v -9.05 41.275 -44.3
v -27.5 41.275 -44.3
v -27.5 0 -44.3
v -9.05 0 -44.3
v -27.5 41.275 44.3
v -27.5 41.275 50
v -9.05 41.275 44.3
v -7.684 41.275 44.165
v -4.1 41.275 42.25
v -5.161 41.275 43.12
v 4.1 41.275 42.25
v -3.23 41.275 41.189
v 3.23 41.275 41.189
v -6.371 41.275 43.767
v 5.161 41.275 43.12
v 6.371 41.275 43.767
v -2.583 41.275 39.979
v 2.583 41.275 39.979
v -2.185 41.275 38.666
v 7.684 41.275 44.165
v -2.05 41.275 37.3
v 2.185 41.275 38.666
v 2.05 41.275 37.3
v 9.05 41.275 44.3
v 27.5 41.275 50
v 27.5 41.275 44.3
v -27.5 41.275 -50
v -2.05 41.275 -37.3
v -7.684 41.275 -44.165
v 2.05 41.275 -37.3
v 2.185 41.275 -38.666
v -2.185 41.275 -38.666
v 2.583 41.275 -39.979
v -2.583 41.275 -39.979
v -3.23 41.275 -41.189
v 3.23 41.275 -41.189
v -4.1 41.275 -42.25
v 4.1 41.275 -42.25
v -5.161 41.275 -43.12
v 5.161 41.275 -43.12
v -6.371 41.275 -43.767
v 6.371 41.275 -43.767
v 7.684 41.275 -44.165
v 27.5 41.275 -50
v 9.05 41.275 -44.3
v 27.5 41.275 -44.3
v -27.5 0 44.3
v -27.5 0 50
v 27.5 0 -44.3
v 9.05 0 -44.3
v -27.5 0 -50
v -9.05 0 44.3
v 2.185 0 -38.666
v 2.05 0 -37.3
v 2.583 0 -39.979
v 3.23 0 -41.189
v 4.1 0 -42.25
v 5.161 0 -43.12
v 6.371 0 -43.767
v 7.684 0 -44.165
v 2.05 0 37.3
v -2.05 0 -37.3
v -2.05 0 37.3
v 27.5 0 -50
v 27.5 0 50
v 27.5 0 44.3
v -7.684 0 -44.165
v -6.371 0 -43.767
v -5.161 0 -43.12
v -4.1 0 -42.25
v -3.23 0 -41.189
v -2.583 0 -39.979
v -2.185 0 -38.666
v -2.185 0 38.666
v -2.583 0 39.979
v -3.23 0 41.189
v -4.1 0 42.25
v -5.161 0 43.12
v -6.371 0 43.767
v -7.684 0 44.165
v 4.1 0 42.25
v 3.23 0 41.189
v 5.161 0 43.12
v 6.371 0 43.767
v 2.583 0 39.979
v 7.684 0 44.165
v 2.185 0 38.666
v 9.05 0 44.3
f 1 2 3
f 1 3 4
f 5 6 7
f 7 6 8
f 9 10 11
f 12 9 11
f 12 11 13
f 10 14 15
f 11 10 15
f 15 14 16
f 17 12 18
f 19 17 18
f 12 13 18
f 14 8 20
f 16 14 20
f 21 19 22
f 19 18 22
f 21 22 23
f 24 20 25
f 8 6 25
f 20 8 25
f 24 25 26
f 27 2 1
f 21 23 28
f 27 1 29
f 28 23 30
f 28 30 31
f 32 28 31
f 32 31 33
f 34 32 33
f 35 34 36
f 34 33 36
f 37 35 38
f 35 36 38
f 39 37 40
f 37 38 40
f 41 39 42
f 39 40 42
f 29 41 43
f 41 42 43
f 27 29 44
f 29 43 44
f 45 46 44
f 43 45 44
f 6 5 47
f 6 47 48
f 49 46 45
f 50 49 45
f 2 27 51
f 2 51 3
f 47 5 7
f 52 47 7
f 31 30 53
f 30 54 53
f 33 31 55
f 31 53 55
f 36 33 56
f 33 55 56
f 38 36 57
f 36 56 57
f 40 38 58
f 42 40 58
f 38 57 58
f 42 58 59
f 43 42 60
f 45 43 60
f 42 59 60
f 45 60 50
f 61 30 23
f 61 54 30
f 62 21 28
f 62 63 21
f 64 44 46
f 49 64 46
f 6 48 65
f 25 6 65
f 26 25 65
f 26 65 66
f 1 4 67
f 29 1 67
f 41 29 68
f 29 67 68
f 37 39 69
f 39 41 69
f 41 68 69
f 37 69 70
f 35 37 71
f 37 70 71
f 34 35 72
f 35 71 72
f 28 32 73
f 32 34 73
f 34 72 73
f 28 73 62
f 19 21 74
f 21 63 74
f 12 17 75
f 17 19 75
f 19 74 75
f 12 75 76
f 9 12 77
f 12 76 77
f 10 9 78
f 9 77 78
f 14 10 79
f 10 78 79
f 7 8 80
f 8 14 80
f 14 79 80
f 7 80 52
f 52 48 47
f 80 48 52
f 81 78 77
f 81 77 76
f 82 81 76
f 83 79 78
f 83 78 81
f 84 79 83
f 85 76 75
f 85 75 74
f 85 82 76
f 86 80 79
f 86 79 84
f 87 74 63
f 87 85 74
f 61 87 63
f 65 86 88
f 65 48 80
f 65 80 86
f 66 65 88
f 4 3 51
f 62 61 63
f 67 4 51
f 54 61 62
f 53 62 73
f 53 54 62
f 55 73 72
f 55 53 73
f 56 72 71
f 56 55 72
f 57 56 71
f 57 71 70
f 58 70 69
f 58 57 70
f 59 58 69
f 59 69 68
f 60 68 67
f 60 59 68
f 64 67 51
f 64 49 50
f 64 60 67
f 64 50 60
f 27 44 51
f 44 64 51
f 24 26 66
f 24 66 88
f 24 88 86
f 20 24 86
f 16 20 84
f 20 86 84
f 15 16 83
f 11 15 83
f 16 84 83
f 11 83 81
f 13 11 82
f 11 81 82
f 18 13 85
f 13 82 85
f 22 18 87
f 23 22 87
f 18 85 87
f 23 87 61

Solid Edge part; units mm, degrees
sketch "Sketch1" plane through (0, 0, 0) normal (0, -1, 0) x (1, 0, 0)
  line L0 (-2.05, 37.3) -> (-2.05, -37.3)
  arc A0 (-2.05, -37.3) -> (-9.05, -44.3) centre (-9.05, -37.3) cw
  line L1 (-27.5, -44.3) -> (-9.05, -44.3)
  line L2 (-27.5, -50) -> (-27.5, -44.3)
  line L3 (27.5, -50) -> (-27.5, -50)
  line L4 (27.5, -50) -> (27.5, -44.3)
  line L5 (27.5, -44.3) -> (9.05, -44.3)
  arc A1 (2.05, -37.3) -> (9.05, -44.3) centre (9.05, -37.3) ccw
  line L6 (2.05, -37.3) -> (2.05, 37.3)
  arc A2 (9.05, 44.3) -> (2.05, 37.3) centre (9.05, 37.3) ccw
  line L7 (27.5, 44.3) -> (9.05, 44.3)
  line L8 (27.5, 50) -> (27.5, 44.3)
  line L9 (-27.5, 50) -> (27.5, 50)
  line L10 (-27.5, 44.3) -> (-27.5, 50)
  line L11 (-27.5, 44.3) -> (-9.05, 44.3)
  arc A3 (-9.05, 44.3) -> (-2.05, 37.3) centre (-9.05, 37.3) cw
  dimension "D1" = 27.5
  dimension "D2" = 27.5
extrude "Protrusion1" add sketch "Sketch1" against normal blind 41.275
